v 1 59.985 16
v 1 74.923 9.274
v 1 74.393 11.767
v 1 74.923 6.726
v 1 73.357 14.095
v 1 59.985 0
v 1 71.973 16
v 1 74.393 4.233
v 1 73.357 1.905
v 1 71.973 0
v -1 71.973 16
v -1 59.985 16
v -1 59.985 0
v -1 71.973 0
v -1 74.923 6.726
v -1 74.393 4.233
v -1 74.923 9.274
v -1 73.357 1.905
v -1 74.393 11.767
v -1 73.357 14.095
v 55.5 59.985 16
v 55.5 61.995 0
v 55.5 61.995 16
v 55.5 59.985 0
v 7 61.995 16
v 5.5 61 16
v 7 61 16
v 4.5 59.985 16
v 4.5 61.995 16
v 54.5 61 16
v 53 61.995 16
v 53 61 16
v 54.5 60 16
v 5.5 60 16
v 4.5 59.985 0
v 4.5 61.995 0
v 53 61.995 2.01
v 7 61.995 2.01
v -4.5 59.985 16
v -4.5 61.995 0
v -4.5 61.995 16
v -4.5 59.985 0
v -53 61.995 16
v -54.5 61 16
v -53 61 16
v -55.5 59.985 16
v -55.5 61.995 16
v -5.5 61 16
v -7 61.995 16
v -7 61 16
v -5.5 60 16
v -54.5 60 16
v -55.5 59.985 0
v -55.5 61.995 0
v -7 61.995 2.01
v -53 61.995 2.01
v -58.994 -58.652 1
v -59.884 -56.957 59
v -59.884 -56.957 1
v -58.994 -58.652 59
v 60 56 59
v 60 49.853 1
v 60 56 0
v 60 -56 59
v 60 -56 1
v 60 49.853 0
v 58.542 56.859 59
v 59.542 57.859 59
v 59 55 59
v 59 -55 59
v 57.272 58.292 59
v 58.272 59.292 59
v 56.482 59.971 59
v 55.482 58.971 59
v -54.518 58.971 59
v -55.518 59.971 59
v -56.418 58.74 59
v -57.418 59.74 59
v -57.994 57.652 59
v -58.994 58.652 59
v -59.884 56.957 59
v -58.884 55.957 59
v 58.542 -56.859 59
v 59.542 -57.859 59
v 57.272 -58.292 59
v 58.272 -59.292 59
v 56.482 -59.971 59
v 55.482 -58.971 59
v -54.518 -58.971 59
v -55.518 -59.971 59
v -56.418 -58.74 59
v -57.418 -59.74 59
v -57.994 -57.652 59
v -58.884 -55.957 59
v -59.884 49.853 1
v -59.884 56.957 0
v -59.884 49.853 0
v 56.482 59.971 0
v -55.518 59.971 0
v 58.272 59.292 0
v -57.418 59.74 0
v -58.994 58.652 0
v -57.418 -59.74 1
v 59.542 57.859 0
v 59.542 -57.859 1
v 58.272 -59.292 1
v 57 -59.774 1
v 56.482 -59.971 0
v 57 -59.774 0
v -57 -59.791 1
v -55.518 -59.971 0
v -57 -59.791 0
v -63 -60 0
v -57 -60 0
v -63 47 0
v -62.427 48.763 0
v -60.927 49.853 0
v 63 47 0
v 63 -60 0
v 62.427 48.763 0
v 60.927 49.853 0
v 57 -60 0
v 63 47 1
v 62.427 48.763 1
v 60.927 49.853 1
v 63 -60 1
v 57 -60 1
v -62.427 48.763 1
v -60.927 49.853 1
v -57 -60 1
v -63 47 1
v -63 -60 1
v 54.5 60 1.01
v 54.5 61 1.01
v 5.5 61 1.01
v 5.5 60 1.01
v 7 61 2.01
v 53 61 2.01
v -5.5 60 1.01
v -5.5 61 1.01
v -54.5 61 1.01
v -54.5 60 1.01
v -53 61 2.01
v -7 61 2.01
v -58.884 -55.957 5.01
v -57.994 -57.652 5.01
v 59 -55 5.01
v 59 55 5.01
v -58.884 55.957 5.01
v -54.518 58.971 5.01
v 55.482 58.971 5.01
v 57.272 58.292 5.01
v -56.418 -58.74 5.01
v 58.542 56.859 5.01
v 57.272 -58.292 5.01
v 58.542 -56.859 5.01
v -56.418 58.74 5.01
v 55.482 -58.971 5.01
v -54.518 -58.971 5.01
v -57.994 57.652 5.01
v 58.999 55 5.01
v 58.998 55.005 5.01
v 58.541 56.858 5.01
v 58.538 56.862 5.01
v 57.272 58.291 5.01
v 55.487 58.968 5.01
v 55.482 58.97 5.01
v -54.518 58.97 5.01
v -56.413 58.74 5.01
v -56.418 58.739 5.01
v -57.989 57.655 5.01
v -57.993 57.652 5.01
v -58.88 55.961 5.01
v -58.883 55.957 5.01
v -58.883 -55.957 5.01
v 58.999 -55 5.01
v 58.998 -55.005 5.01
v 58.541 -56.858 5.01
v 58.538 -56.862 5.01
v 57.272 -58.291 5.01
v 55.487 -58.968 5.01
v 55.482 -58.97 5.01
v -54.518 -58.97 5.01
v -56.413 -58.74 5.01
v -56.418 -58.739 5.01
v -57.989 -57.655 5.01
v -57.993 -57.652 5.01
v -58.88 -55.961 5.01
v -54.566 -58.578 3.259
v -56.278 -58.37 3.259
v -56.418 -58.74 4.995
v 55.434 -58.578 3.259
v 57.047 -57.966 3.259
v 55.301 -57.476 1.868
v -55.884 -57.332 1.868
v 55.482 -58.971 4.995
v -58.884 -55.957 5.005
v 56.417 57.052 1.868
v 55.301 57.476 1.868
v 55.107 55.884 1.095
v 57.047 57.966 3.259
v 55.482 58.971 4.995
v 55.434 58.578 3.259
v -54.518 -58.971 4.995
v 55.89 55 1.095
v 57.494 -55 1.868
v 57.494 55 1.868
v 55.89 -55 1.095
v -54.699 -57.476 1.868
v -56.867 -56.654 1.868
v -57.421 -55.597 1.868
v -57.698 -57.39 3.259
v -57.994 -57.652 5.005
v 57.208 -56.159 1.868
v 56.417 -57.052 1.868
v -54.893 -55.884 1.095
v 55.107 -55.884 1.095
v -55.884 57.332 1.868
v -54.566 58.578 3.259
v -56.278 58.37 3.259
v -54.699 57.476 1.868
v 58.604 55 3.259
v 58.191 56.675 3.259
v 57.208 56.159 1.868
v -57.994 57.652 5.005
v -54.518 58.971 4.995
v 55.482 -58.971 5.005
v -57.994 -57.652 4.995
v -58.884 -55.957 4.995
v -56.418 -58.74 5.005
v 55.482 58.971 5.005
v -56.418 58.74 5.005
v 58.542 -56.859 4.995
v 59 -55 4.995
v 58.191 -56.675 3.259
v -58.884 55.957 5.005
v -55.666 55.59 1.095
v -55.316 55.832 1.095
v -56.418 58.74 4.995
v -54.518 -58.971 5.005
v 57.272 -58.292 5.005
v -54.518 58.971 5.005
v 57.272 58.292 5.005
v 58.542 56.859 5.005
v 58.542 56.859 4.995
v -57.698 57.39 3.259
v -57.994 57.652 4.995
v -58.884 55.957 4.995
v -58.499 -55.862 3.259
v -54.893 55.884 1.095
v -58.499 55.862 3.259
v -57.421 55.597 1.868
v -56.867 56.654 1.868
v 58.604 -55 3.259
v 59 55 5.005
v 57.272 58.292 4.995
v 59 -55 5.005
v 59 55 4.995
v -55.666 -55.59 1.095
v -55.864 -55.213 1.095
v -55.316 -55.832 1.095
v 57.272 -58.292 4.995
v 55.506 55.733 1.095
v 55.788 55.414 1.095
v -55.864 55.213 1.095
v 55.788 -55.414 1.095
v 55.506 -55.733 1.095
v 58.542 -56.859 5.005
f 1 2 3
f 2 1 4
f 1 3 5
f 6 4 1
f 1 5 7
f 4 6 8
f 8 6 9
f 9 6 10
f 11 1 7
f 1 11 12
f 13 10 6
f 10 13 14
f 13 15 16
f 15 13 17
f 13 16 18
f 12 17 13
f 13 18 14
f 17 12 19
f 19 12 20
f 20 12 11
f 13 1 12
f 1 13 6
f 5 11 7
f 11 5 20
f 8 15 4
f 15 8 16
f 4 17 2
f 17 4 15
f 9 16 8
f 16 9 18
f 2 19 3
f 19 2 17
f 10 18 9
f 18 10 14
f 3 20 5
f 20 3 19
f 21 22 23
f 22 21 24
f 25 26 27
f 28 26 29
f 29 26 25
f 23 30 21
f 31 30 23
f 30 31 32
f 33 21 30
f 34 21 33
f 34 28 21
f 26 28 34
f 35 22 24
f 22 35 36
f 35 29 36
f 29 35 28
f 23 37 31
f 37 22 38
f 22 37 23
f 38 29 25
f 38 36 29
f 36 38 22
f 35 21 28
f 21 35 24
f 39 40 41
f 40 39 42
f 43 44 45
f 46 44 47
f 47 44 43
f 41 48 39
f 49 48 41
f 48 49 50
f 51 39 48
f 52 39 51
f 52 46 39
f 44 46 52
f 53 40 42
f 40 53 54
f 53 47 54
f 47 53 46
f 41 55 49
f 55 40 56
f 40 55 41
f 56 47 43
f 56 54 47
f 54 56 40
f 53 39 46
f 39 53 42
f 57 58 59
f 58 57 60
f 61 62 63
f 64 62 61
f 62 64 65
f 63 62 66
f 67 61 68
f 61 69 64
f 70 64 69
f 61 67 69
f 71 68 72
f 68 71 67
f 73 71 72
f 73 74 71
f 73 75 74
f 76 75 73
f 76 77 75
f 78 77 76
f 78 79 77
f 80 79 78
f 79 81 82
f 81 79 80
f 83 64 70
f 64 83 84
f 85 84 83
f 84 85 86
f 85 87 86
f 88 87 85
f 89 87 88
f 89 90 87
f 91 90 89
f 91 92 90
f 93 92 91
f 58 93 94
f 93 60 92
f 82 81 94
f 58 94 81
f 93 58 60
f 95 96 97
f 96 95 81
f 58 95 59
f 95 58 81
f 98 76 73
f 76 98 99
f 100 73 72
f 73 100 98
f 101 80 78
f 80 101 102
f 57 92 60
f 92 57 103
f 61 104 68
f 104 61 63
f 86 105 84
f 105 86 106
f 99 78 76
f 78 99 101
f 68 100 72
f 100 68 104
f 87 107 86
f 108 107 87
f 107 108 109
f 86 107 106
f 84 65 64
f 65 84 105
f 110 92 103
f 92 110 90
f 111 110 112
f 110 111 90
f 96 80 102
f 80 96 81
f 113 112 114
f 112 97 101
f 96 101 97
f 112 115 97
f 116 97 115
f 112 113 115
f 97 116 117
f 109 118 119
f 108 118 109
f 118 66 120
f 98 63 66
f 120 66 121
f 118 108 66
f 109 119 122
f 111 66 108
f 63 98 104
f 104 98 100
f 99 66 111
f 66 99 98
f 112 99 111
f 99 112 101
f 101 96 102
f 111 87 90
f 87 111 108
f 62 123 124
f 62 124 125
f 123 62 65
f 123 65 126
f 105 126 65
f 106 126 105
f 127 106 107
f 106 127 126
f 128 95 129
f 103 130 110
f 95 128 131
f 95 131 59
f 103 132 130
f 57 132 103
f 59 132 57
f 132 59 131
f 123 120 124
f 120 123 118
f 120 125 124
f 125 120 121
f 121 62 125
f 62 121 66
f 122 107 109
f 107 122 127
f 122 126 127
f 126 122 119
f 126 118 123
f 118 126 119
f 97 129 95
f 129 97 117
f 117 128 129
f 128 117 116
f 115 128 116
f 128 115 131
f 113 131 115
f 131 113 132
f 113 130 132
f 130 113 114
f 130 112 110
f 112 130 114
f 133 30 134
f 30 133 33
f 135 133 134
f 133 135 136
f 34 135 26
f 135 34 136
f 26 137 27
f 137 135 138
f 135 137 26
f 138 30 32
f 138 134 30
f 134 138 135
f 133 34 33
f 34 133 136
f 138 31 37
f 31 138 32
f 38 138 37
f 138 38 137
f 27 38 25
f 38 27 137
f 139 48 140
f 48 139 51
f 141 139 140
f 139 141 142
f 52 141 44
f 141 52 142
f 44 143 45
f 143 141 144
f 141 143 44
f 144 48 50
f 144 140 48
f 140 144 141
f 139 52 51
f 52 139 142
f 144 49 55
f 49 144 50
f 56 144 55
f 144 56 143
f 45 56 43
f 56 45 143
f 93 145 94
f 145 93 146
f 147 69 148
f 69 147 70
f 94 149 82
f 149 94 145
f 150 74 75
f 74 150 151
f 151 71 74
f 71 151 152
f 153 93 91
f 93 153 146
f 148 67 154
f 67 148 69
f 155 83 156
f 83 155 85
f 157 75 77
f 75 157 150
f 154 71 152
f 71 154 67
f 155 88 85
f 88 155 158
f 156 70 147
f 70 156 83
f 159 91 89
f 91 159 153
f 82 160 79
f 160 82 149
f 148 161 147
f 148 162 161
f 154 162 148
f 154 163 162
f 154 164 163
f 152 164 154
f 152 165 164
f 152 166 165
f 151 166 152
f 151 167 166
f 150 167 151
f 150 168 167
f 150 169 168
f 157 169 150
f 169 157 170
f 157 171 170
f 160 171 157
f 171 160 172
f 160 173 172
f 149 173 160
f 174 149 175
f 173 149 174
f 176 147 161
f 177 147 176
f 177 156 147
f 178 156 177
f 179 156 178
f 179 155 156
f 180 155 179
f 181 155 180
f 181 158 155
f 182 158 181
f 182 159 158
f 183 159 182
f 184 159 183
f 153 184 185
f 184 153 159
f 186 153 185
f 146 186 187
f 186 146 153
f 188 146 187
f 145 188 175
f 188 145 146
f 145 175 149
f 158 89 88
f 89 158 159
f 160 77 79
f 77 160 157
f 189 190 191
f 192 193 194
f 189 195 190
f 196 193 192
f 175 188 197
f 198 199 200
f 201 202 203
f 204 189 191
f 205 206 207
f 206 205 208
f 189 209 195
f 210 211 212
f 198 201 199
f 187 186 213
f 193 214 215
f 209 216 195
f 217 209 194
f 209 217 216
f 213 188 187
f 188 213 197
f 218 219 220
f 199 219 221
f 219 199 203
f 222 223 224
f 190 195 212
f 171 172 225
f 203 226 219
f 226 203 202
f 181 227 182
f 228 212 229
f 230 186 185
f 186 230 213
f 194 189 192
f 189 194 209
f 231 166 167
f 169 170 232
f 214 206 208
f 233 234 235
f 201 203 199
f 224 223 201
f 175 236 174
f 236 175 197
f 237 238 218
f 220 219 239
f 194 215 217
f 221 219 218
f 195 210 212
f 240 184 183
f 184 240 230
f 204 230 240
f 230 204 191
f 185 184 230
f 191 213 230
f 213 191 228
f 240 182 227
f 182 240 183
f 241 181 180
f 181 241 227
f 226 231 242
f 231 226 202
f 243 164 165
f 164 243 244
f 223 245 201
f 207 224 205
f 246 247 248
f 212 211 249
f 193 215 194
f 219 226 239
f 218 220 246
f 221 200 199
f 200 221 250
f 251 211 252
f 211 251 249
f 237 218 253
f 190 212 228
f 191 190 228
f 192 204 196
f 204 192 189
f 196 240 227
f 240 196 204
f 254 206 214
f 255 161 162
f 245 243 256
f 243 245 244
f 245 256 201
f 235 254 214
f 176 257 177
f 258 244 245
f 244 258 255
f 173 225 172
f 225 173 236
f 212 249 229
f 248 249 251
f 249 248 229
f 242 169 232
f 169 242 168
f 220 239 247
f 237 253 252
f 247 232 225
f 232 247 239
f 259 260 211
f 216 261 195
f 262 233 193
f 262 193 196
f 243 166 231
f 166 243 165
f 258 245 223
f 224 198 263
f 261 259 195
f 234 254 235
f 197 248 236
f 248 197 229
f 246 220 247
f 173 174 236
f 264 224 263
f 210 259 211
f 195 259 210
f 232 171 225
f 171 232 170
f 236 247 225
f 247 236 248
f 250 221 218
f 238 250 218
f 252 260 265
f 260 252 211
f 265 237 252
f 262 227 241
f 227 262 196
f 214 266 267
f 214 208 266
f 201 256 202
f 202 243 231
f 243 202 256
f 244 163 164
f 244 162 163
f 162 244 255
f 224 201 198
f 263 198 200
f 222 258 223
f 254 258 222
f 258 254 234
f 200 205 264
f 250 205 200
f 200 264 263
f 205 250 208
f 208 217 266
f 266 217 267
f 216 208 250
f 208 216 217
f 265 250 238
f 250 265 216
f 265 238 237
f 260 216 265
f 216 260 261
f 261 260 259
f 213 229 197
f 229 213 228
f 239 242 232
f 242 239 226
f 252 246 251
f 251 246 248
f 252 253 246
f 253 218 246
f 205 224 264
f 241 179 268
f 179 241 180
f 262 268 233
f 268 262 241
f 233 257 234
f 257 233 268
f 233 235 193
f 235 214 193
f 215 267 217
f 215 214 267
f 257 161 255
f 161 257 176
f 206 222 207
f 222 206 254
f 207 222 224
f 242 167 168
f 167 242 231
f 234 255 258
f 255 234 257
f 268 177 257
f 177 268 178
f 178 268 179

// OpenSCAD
// Customizable Ultimate Drawer System Drawer
// Remixed from MarcElbichon's Ultimate Drawer System https://www.thingiverse.com/thing:2302575 (CC-BY 4.0)
// Copyright (C) 2019 by Brian Alano (and possibly others)
// Licensed under the Creative Commons Attribution-NonCommercial-ShareAlike 4.0 (CC-BY-NC-SA 4.0)

/* Design notes
// width is x dimension, across the face of the drawer
// depth is y dimension, front to back of the drawer
// height is z dimension
*/

/* Coding Style Guide 
 * User parameters and modules use underscores between words.
 * Other variable names use camel case.
 * Separate features into their own modules if they are more than a couple lines long.
 * All dimensions should be assigned to variables, usually global ones so they can be found easily.
 * Keep local modules local.
 * Keep local variables local.
 * Maintain Thingiverse Customizer compatibility.
 * Maintain backwards compatibility with MarcElbichon's Ultimate Drawer System 
   (https://www.thingiverse.com/thing:2302575). This means a 1Ux1Ux1U drawer 
   made with this program will work in MarcElbichon's shelf. 
*/

/* [Size] */
// units wide (actual drawer width is 131*U_wide - 10)
U_wide=1; // [1, 1.5]
// units deep (actual drawer depth is 130*U_deep - 10)
U_deep=1; // [1, 1.5]
// units high (actual drawer height is 20*U_high - 1)
U_high=3; // [1:15]

/* [Features] */
// What kind of drawer pull?
pull_style = "original"; // [original, ergonomic]
// modify the flange to allow for the drawer catch on the shelf?
drawer_catch = "no"; // [yes, no]
// include slots on the back of the drawer for the locking mechanism
rear_lock_slot = "no"; // [yes, no]

/* [Hidden] */
drawerUnit=[120, 120, 19];
shelfPadding=[11, 10, 1];

wallThickness = 1;
shelfUnit = [131, 130, 30];
shelf = [shelfUnit.x * U_wide, shelfUnit.y * U_deep, (shelfUnit.z - wallThickness*2) * U_high - wallThickness*2]; // reference dimension from shelf .scad file.
drawer = [shelf.x - shelfPadding.x, shelf.y - shelfPadding.y, shelf.z - shelfPadding.z];

cornerR = 4;
cornerD = cornerR * 2;
flangeR = 3;
flangeD = flangeR * 2;
flange = [3, d_to_y(U_deep)-10, 1];
pullD = 24.38;
pull = [2, pullD/2 + 2.8, 16];
label = [51, 2, 16];
labelSlot = [49, 1, 15];
labelWindow = [46, 1, 14];
catch = [flange.x * 0.4, d_to_y(U_deep) - 4, flange.z];
rearLockSlot = [26, 3.5, 8];

// utility variables
epsilon = 0.01;

// the spacing between drawings is 20, or drawerUnit.z + 1. so a 1U drawer is 19, a 2U drawer is 39, etc.
//FIXME replace with drawer[]
//FIXME put lock on bottom, not top.
function u_to_z(u) = (drawerUnit.z + shelfPadding.z) * u - shelfPadding.z;
function w_to_x(w) = (drawerUnit.x + shelfPadding.x) * w - shelfPadding.x;
function d_to_y(d) = (drawerUnit.y + shelfPadding.y) * d - shelfPadding.y;

module drawer() {
    module add() {
        // main body
        linear_extrude(u_to_z(U_high))
            roundtangle(width=w_to_x(U_wide), length=d_to_y(U_deep), radius=cornerR);
        // flanges
        linear_extrude(flange.z) 
            for (i = [1, -1]) {
                translate([w_to_x(U_wide)/2*i, -d_to_y(U_deep)/2] ) {
                    translate([-flange.x, 0]) square([flange.x*2, flange.y - flangeR]);
                    translate([0, flange.y - flangeR]) circle(r=flangeR);
                }
            }
        // pull
        translate([0, d_to_y(U_deep)/2, pull.z/2]) pull(style=pull_style);
        // label holders (positive part)
        for (i = [1, -1]) {
            translate([w_to_x(U_wide)/4*i, (d_to_y(U_deep) + label.y)/2 - epsilon, label.z/2]) cube([label.x, label.y + epsilon, label.z], center=true);
        }
        // rear lock pockets
        if (rear_lock_slot == "yes")
            for(j = [1:U_high])
                translate([0, -d_to_y(U_deep)/2, u_to_z(j)]) 
                    rearLockSlot();
    }
    
    module subtract() {
        // main cut, minus fillets
        cut = [w_to_x(U_wide) - wallThickness*2, d_to_y(U_deep) - wallThickness*2, u_to_z(U_high) - wallThickness - cornerR];
        translate([0, 0, u_to_z(U_high) - cut.z + epsilon]) 
            linear_extrude(cut.z + epsilon) roundtangle(cut.x, cut.y, cornerR);
        // fillet cut
       translate([0, 0, u_to_z(U_high) - cut.z]) 
            minkowski() {
                cube([cut.x - cornerD, cut.y - cornerD, epsilon], center=true);
                sphere(d=cornerD);
            }
        for (i=[1, -1]) {
            // label cuts
            translate([w_to_x(U_wide)/4*i, d_to_y(U_deep)/2 + labelSlot.y/2, labelSlot.z/2 + (label.z - labelSlot.z) + epsilon])
                cube(labelSlot, center=true);
            translate([w_to_x(U_wide)/4*i, d_to_y(U_deep)/2 + label.y - wallThickness/2, labelWindow.z/2 + (label.z - labelWindow.z) + epsilon])
                cube(labelWindow, center=true);
            // drawer catch cutout
            if (drawer_catch == "yes") {
               translate([(w_to_x(U_wide)/2 + flange.x - catch.x/2 + epsilon)*i, 
                d_to_y(U_deep)/2 - catch.y/2, 
                catch.z/2 - epsilon])
                    cube([catch.x + epsilon, catch.y, catch.z + 2*epsilon], center=true);
            }
        }
    }
     
    difference() {
        add();  
        subtract();
    }
}

module pull(style) {
    // drawer pull
    module original() {
        intersection() {
           translate([0, pull.y/2 - epsilon]) cube([pull.x, pull.y + epsilon, pull.z], center = true);
           translate([0, pull.y - pullD/2]) rotate([0, 90, 0]) cylinder(d=pullD, h=pull.x, center = true);
        }
    }

    module ergonomic() {
        difference() {
            original();
            translate([0, pull.y - pullD/2]) rotate([0, 90, 0]) {
                intersection() {
                    cylinder(d=pullD/2, h=pull.x+epsilon*4, center = true);
                    translate([0, pullD/3]) cylinder(d=pullD/2, h=pull.x+epsilon*4, center = true);
                }
            }
        }
        scale([3, 1, 1]) difference() {
            original();
            translate([0, pull.y - pullD/2]) rotate([0, 90, 0]) cylinder(d=pullD-pull.x*2, h=pull.x+epsilon*2, center = true);
        }
    }

    if (style == "original") original();
    if (style == "ergonomic") ergonomic();
}

module rearLockSlot() {    
    module half() {
        translate([rearLockSlot.x/2, -rearLockSlot.y, -drawerUnit.z + rearLockSlot.z/2]) 
        {
            cube([wallThickness, rearLockSlot.y, rearLockSlot.z/2]);
            rotate([0, 90, 0])
                linear_extrude(wallThickness) 
                polygon([[0, 0], [rearLockSlot.y, rearLockSlot.y], [0, rearLockSlot.y]]);
        }
        translate([0, -rearLockSlot.y, -drawerUnit.z + rearLockSlot.z/2]) 
            cube([rearLockSlot.x/2, wallThickness, rearLockSlot.z/2]);
    }
    
    module add() {
        for(i=[0, 1]) 
            mirror([i, 0, 0]) half();
    }
    add();
//    half();
}

module roundtangle(width, length, radius) {
    minkowski() {
                square([width - radius*2, length - radius*2], center=true);
                circle(r=radius);
            }
}
drawer();
//pull(style="ergonomic");
//rear_lock();
